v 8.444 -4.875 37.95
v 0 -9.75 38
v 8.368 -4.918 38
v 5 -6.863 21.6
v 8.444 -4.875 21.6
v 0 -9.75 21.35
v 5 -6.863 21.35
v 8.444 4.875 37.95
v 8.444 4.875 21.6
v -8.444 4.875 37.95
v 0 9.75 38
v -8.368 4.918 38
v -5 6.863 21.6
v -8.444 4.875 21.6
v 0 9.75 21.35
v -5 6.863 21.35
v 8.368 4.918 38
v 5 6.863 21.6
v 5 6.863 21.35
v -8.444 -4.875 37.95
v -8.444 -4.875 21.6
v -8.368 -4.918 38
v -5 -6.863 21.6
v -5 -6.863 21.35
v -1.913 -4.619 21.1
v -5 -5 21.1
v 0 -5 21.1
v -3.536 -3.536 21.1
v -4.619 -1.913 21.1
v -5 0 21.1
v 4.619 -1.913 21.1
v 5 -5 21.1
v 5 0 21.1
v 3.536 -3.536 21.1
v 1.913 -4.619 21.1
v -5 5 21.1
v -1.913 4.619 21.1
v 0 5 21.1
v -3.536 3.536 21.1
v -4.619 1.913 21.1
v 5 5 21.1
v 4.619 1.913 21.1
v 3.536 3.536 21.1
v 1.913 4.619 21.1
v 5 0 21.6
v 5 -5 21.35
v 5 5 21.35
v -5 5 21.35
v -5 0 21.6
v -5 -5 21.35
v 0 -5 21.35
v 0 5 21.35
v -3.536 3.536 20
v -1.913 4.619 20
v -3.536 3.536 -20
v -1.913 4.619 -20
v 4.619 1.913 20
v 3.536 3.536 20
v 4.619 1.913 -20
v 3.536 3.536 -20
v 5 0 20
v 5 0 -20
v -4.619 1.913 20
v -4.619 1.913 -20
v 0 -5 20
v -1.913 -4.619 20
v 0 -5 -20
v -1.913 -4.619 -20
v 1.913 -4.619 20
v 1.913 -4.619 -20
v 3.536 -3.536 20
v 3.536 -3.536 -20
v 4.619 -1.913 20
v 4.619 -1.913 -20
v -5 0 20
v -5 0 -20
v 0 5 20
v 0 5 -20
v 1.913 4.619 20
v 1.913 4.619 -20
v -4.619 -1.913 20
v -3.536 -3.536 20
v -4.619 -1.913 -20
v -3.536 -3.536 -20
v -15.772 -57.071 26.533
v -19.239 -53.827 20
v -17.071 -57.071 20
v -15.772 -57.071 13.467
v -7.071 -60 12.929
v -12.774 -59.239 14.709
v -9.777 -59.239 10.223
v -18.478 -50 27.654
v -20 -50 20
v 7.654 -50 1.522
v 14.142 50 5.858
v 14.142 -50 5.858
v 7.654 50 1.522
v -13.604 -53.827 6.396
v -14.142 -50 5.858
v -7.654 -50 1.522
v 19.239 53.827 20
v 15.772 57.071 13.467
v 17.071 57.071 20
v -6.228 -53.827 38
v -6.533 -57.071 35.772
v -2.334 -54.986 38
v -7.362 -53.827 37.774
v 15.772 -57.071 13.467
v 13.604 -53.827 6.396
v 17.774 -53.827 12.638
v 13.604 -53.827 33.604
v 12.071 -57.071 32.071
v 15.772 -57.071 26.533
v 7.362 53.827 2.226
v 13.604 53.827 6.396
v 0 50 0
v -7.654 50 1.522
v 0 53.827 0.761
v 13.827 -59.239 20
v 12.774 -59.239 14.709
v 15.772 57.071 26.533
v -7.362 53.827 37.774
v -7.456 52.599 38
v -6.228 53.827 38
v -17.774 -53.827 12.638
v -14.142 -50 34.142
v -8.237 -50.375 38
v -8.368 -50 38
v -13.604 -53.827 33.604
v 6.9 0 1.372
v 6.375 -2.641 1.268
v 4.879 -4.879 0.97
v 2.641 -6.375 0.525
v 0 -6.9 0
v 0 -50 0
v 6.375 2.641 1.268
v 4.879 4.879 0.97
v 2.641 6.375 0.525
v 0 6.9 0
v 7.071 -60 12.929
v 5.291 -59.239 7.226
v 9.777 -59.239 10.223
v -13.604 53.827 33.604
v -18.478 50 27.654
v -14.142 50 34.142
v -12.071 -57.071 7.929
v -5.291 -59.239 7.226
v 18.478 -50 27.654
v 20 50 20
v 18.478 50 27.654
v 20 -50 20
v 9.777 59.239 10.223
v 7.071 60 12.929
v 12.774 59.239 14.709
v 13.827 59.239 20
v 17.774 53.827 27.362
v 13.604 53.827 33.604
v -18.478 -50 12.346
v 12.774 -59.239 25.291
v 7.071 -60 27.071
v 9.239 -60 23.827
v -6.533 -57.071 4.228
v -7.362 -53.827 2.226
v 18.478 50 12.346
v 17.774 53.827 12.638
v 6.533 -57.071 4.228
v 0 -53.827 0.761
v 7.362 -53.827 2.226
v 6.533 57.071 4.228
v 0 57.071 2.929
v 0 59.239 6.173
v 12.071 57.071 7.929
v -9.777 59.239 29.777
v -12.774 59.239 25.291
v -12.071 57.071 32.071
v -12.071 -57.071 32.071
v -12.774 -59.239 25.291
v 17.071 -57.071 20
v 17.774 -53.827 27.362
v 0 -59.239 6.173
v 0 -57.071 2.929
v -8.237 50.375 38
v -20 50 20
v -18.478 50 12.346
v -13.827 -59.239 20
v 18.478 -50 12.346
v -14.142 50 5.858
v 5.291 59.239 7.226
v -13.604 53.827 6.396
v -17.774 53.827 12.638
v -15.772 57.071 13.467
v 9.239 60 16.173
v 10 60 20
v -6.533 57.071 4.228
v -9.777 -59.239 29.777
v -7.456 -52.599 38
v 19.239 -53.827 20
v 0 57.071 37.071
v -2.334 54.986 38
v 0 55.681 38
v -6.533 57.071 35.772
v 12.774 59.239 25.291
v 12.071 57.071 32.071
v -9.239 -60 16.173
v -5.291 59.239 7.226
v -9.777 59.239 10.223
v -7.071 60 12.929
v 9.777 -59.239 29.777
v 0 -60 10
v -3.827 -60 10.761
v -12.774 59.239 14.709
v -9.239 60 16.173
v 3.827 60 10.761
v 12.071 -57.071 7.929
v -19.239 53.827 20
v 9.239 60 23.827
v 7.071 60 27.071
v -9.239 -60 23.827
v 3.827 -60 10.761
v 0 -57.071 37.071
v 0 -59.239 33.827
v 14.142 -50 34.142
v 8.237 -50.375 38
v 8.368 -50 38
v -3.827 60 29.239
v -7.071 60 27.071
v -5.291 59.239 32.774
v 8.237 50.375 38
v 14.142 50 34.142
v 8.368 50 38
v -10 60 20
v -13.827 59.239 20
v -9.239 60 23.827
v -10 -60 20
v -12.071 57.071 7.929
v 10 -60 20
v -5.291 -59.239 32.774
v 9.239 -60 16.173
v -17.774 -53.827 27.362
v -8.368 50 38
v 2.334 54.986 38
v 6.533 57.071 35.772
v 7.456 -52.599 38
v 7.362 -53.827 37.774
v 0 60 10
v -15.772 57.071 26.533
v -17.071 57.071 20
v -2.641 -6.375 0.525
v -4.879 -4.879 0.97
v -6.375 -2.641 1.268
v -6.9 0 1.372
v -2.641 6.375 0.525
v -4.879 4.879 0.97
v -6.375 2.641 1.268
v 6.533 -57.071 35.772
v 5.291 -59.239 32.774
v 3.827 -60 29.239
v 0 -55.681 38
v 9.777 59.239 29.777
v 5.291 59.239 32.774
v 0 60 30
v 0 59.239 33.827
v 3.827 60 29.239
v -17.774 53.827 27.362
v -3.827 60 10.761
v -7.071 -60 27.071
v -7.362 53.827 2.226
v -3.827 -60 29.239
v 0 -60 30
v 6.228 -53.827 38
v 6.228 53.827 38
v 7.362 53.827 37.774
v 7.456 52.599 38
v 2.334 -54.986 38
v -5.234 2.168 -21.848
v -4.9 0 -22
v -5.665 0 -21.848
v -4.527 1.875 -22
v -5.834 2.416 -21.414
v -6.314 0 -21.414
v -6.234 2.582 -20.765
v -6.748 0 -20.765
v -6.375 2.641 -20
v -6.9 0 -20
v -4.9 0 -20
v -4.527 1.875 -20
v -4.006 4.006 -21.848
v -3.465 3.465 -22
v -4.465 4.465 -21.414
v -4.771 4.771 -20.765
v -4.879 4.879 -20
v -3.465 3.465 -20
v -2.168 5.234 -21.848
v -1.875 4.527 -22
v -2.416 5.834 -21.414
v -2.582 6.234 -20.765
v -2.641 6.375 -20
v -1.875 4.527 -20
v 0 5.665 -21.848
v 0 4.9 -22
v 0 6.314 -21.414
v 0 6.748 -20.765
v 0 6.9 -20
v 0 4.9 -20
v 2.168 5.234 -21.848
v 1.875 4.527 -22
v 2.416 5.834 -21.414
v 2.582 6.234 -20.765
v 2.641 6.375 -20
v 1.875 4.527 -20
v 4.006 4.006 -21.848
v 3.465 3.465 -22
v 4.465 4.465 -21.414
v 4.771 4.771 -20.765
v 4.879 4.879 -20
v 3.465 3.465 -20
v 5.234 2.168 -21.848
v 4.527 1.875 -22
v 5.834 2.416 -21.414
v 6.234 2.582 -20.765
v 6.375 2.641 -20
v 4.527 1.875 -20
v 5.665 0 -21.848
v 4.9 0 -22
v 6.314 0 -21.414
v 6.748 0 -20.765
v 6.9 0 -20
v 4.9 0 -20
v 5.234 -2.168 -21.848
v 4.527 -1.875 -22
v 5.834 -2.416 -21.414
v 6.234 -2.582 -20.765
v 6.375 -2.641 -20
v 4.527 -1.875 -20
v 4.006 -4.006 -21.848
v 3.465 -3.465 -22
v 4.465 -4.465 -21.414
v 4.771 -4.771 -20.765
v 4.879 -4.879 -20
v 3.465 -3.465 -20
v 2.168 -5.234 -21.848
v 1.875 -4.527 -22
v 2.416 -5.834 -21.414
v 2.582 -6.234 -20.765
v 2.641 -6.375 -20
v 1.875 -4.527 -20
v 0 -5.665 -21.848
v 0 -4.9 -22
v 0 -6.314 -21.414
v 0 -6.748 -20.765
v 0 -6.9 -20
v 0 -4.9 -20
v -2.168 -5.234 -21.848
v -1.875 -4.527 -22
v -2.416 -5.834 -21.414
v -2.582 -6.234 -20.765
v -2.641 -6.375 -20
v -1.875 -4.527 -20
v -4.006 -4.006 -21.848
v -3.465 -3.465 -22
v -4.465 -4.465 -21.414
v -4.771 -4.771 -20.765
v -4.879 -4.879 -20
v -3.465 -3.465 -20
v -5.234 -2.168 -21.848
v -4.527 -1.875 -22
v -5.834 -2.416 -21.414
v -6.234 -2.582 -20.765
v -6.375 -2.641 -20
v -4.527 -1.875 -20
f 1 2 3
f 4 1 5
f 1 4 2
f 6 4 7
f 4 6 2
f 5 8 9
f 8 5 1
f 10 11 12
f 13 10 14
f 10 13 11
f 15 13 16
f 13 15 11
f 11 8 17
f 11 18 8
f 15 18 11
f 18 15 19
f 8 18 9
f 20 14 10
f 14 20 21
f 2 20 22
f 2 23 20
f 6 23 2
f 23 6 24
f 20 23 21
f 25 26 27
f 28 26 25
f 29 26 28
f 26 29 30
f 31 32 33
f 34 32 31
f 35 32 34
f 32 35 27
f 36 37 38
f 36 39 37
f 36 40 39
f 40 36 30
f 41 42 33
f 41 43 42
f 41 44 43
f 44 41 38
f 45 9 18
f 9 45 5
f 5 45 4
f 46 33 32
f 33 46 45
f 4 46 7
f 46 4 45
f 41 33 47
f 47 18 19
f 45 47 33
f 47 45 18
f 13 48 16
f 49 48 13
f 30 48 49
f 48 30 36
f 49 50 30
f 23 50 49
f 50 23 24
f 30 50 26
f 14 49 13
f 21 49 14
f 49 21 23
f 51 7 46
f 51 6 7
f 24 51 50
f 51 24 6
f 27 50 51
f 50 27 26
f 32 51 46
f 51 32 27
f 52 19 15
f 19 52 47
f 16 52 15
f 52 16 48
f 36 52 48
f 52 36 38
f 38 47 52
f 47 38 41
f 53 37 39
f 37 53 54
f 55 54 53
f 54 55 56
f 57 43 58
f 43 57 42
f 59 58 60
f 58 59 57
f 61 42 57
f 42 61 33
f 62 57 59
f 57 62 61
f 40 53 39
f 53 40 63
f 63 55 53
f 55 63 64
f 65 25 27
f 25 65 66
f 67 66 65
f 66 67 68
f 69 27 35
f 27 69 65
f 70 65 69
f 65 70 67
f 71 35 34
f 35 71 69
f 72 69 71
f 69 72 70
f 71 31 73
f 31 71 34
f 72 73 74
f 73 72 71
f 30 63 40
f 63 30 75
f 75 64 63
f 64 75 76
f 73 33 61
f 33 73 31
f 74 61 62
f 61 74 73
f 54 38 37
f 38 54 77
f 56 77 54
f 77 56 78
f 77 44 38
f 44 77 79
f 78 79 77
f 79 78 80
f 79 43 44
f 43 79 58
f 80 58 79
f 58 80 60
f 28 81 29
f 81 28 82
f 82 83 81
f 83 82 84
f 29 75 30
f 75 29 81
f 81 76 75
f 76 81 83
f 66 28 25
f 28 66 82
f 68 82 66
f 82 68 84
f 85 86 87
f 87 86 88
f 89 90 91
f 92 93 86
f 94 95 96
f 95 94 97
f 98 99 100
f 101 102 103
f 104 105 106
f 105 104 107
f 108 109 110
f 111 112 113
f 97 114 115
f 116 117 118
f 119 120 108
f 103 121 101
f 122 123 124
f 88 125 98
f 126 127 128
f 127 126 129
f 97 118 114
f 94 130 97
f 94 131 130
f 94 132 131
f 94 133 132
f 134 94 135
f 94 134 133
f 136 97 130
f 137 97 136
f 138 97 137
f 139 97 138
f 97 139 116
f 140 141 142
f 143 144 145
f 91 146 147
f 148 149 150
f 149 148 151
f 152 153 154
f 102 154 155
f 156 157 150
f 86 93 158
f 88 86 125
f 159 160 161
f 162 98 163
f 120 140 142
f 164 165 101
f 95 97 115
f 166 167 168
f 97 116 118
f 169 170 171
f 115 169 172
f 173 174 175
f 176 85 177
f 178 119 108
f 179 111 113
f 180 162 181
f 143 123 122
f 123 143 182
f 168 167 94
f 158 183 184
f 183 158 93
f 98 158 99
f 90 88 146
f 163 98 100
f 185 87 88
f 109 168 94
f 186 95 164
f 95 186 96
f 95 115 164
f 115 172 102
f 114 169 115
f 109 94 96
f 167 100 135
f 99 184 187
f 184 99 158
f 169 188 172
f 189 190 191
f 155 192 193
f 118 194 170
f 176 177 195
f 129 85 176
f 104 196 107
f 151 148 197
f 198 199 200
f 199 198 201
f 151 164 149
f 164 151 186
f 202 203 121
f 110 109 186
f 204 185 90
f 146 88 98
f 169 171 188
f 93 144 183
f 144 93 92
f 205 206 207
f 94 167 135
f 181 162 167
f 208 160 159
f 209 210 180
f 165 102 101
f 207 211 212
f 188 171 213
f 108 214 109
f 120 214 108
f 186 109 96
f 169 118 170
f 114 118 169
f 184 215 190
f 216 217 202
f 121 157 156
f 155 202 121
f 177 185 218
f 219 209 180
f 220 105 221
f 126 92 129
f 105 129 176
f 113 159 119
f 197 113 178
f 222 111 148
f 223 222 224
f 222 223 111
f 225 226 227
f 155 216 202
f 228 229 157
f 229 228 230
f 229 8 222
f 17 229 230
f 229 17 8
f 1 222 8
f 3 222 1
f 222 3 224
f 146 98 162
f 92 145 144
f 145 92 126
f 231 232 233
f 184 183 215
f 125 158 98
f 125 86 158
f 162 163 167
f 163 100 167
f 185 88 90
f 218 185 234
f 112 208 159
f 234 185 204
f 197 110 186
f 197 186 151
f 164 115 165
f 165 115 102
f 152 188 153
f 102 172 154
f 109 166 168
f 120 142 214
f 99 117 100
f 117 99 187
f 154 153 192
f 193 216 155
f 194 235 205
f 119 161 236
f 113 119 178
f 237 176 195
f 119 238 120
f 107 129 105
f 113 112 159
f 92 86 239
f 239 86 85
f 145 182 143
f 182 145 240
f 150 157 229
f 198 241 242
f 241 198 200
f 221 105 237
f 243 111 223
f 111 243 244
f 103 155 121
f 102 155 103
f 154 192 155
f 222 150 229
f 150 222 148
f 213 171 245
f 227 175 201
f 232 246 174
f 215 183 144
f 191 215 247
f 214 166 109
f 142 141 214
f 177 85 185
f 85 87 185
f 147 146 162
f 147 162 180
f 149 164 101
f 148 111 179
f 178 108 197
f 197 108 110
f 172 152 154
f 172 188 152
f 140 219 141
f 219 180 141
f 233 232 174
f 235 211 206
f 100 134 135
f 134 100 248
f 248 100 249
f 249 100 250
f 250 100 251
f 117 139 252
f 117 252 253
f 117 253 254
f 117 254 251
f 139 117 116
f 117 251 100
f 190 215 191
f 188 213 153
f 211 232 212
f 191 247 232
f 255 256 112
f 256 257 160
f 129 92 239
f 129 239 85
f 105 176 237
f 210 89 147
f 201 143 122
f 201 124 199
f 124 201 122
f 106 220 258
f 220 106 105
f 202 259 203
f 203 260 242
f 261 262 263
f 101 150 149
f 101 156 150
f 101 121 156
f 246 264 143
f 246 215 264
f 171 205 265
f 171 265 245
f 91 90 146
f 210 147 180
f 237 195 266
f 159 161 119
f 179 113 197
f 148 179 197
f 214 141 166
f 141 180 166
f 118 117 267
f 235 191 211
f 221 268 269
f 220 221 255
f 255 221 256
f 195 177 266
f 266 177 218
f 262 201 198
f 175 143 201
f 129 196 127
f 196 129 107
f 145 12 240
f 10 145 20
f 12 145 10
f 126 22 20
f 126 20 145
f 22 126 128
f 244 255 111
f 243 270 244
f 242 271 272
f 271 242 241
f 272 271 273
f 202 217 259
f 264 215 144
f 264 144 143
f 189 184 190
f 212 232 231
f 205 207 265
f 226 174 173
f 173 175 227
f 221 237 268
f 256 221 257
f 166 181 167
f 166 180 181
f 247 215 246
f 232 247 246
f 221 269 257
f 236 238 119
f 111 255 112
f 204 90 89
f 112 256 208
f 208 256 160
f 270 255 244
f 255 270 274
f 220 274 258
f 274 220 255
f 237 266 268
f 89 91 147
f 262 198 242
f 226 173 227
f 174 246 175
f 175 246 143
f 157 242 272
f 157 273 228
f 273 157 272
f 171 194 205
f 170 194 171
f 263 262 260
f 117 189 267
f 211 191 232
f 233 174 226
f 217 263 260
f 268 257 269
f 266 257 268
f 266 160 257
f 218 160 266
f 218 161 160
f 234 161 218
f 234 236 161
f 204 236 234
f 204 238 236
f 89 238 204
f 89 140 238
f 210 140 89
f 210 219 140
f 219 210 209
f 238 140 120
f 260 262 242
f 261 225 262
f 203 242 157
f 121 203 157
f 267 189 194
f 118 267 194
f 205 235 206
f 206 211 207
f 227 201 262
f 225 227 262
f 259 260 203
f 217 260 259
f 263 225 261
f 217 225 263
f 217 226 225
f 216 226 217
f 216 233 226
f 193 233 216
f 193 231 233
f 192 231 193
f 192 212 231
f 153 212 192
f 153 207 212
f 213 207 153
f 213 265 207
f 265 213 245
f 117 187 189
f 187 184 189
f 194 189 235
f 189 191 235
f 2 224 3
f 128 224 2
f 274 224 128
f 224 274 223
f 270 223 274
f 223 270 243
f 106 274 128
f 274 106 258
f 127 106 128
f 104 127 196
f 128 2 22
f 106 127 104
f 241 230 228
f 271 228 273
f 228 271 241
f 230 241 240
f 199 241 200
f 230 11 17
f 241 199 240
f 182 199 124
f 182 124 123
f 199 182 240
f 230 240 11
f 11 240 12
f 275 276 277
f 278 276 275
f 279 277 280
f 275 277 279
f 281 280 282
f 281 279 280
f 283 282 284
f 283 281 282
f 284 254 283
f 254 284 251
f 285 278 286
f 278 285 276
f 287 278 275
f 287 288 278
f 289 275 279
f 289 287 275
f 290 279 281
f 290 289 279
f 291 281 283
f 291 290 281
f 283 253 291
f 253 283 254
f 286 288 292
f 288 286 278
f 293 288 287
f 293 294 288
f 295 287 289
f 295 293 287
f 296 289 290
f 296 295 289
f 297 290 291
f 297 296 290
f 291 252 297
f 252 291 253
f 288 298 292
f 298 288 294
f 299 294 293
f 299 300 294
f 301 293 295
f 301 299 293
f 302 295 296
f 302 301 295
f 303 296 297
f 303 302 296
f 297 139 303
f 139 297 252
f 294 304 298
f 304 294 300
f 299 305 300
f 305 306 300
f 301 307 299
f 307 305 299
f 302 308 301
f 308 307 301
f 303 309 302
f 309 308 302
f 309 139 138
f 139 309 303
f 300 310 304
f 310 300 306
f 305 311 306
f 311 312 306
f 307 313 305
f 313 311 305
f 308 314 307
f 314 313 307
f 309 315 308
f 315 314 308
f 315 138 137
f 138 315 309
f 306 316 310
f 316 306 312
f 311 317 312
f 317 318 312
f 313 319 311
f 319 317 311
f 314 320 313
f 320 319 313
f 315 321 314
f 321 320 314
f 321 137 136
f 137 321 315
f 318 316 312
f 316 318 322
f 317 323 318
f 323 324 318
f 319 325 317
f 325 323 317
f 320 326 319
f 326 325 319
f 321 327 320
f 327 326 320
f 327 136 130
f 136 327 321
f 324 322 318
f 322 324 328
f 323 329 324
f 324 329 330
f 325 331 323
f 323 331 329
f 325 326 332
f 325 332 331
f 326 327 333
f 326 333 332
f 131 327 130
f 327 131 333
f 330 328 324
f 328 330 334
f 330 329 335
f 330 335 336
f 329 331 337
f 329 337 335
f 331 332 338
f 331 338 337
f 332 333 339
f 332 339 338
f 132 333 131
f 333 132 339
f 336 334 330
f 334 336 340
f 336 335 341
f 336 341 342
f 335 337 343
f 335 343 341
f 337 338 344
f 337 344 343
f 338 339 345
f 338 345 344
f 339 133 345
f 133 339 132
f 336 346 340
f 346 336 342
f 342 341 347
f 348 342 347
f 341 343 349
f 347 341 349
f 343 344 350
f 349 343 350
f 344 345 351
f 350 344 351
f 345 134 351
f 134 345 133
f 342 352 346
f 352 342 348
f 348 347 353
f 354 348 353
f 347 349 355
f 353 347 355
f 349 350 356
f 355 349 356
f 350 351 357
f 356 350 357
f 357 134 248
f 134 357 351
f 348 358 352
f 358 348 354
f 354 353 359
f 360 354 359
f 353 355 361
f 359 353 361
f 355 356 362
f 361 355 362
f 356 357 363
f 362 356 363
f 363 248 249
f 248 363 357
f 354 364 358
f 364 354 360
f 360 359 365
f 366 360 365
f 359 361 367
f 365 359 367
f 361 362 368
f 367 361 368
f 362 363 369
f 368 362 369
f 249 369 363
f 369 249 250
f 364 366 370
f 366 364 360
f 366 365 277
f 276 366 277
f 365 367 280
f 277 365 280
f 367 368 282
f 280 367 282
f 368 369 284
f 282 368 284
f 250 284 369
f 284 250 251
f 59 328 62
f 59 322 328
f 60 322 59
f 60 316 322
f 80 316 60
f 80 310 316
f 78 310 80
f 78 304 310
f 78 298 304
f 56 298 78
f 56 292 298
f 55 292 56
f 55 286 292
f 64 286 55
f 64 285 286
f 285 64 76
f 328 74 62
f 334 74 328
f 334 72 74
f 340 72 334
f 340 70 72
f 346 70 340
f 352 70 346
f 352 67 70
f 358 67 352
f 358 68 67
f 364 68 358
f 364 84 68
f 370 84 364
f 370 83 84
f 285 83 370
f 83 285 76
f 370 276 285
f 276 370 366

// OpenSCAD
$fn=16;

layer=0.25;

bolt=9.8;
boltHead=19.3;
boltHeadL=16.4; //6.7+9.7;

handleD=40;
handleL=120;
r=10;

topCut=2;

//coverIntersect=5;
coverL=22;
wall=2;

tol=0.2;

difference(){
	rotate([90,0,0]) translate([0,handleD/2,-handleL/2]) cylinderRounded(d=[0,handleD],h=handleL,r=[0,r,0,r]);
	
	translate([0,0,handleD-topCut-boltHeadL]) boltHex(bolt=bolt,boltHead=boltHead,boltPad=0,layer=layer,tol=tol);
	
	translate([-handleL/2,-handleL/2,handleD-topCut]) cube([handleL,handleL,2*topCut]);
}

//thread cover
translate([0,0,-coverL]) cylinderRounded(d=[bolt+tol,bolt+2*wall],h=coverL+handleD/2,r=[0,wall,0,0]);


///////////////////////////////////////////////

module cylinderRounded(d=[20,40],h=30,r=[1,-10,4,1]){
	rotate_extrude(convexity = 10)
	{
		//square
		difference(){
			translate([d[0]/2,0,0]) square([(d[1]-d[0])/2,h]);
			if(r[0]>0) translate([d[0]/2,0,0]) square([r[0],r[0]]);
			if(r[1]>0) translate([d[1]/2-r[1],0,0]) square([r[1],r[1]]);
			if(r[2]>0) translate([d[0]/2,h-r[2],0]) square([r[2],r[2]]);
			if(r[3]>0) translate([d[1]/2-r[3],h-r[3],0]) square([r[3],r[3]]);
		}
		
		//corners
		
		if(r[0]>0){
			intersection(){
				translate([d[0]/2+r[0], r[0], 0]) circle(r = r[0]);
				translate([d[0]/2,0,0]) square([r[0],r[0]]);
			}
		} else {
			difference(){
				translate([d[0]/2+r[0], 0, 0]) square([-r[0],-r[0]]);
				translate([d[0]/2+r[0], -r[0], 0]) circle(r = -r[0]);
			}
		}
		
		if(r[1]>0){
			intersection(){
				translate([d[1]/2-r[1], r[1], 0]) circle(r = r[1]);
				translate([d[1]/2-r[1],0,0]) square([r[1],r[1]]);
			}
		} else {
			difference(){
				translate([d[1]/2, 0, 0]) square([-r[1],-r[1]]);
				translate([d[1]/2-r[1], -r[1], 0]) circle(r = -r[1]);
			}
		}
		
		if(r[2]>0){
			intersection(){
				translate([d[0]/2+r[2], h-r[2], 0]) circle(r = r[2]);
				translate([d[0]/2,h-r[2],0]) square([r[2],r[2]]);
			}
		} else {
			difference(){
				translate([d[0]/2+r[2], h+r[2], 0]) square([-r[2],-r[2]]);
				translate([d[0]/2+r[2], h+r[2], 0]) circle(r = -r[2]);
			}
		}

		if(r[3]>0){
			intersection(){
				translate([d[1]/2-r[3], h-r[3], 0]) circle(r = r[3]);
				translate([d[1]/2-r[3],h-r[3],0]) square([r[3],r[3]]);
			}
		} else {
			difference(){
				translate([d[1]/2, h+r[3], 0]) square([-r[3],-r[3]]);
				translate([d[1]/2-r[3], h+r[3], 0]) circle(r = -r[3]);
			}
		}		
	}
}

module boltHex(bolt=3, boltHead=6, boltPad=3, boltHeadL=100, boltL=100,layer=0.2,tol=0.2,not=0.01){
	translate([0,0,-boltL+not+boltPad]) cylinder(d=bolt+tol,h=boltL);

	translate([0,0,boltPad-2*layer]) difference(){
		rotate([0,0,30]) cylinder(d=boltHead+tol,h=boltHeadL,$fn=6);
		
		//easy print
		translate([(bolt+tol)/2,-(boltHead+tol)/2,-not]) cube([(boltHead-bolt)/2,boltHead+tol,2*layer+not]);
		translate([-(boltHead+tol)/2,-(boltHead+tol)/2,-not]) cube([(boltHead-bolt)/2,boltHead+tol,2*layer+not]);
		translate([-(boltHead+tol)/2,-(boltHead+tol)/2,-not]) cube([boltHead+tol,(boltHead-bolt)/2,layer+not]);
		translate([-(boltHead+tol)/2,(bolt+tol)/2,-not]) cube([boltHead+tol,(boltHead-bolt)/2,layer+not]);
	}
}
